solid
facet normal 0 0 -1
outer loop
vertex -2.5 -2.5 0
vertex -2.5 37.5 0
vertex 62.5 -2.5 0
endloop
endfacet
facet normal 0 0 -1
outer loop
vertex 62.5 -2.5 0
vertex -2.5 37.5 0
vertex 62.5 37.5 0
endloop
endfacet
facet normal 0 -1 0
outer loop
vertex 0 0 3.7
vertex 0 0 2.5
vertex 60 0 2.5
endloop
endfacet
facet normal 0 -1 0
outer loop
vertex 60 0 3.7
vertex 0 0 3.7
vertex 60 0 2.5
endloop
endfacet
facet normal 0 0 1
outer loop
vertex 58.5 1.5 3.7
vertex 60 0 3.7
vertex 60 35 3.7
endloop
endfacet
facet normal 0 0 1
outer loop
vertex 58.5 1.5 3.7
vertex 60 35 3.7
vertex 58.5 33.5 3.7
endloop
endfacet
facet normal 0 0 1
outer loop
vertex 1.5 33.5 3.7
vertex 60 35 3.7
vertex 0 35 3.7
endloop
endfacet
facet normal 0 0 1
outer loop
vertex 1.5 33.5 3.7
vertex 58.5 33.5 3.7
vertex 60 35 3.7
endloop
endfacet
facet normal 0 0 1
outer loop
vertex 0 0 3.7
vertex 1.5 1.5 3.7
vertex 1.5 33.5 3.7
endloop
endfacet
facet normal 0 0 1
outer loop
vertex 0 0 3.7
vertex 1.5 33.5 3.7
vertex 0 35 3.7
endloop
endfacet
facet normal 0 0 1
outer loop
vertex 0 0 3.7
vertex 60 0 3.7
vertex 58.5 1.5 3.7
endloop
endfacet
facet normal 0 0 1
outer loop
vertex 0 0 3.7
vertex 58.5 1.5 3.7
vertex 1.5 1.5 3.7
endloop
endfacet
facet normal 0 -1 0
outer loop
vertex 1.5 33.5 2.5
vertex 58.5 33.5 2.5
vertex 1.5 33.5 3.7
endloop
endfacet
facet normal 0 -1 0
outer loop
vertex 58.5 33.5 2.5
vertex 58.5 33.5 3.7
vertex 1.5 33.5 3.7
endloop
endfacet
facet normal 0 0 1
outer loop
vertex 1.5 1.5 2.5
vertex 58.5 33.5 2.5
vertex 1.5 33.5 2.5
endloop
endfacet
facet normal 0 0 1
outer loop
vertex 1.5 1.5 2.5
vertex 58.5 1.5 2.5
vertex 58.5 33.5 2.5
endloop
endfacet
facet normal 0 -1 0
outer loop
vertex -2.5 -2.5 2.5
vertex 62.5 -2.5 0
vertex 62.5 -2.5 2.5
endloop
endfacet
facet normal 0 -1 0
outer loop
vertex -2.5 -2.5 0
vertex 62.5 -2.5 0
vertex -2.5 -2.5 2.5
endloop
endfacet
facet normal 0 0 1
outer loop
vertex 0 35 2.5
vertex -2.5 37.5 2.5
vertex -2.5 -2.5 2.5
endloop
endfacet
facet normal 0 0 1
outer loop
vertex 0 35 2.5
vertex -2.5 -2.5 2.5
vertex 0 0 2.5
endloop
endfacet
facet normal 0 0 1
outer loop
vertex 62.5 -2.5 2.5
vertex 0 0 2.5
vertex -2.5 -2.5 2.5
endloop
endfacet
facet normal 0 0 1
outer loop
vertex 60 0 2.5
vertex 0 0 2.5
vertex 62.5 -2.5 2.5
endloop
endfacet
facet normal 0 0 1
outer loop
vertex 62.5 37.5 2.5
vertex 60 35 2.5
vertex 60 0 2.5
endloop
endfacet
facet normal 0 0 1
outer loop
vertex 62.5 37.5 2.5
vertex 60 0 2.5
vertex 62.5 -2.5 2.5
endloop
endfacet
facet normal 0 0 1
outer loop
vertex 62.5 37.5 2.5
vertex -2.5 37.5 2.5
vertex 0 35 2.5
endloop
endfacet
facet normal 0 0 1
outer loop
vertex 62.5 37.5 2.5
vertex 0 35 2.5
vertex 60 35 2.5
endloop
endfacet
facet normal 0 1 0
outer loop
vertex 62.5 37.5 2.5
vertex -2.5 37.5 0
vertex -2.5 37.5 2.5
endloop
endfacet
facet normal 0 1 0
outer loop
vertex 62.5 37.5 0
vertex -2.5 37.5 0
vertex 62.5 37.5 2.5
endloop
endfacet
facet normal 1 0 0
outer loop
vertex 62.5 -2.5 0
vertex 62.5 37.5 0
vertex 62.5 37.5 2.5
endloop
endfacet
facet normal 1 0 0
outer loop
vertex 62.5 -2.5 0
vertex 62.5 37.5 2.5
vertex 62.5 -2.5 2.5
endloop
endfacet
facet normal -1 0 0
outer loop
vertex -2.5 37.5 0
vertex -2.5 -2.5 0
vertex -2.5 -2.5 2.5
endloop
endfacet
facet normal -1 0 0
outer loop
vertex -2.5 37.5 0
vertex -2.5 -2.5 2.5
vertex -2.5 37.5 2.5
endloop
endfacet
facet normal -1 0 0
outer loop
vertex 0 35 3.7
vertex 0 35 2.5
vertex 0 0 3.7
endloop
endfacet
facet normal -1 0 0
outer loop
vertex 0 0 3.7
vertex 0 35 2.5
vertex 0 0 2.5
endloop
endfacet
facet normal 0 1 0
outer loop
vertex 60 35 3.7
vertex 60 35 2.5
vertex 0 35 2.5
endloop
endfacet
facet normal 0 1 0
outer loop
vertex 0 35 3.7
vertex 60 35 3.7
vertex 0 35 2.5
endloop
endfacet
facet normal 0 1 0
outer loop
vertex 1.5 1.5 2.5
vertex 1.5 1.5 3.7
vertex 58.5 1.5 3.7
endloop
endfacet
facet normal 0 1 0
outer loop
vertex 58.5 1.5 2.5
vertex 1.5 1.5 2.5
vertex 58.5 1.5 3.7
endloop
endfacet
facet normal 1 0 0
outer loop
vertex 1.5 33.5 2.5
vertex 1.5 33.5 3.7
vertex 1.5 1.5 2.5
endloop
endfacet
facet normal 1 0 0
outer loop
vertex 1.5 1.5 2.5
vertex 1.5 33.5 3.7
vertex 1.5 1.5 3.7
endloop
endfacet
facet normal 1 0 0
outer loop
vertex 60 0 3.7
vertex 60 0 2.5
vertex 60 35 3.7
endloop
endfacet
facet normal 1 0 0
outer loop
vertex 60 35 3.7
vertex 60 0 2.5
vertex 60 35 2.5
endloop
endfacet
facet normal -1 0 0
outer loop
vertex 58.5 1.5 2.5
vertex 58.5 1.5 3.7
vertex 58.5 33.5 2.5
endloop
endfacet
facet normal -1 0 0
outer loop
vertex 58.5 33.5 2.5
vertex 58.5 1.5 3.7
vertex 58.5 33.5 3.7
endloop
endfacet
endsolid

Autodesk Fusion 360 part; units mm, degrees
sketch "Skizze2" plane through (0, 0, 0) normal (0, 0, 1) x (1, 0, 0)
  line L0 (-2.5, 35) -> (-2.5, 37.5)
  line L1 (-2.5, 37.5) -> (0, 37.5)
  line L2 (62.5, 0) -> (62.5, -2.5)
  line L3 (62.5, -2.5) -> (60, -2.5)
  line L4 (-2.5, 37.5) -> (62.5, 37.5)
  line L5 (62.5, 37.5) -> (62.5, -2.5)
  line L6 (62.5, -2.5) -> (-2.5, -2.5)
  line L7 (-2.5, -2.5) -> (-2.5, 37.5)
  point P0 (0, 35)
  point P1 (60, 0)
  dimension "d3" = 2.5
  dimension "d4" = 2.5
  dimension "d5" = 2.5
  dimension "d6" = 2.5
extrude "Extrusion1" add sketch "Skizze2" along normal blind 2.5
sketch "Skizze3" plane through (0, 0, 2.5) normal (0, 0, 1) x (-1, 0, 0)
  line L0 (2.5, 2.5) -> (-62.5, 2.5)
  line L1 (-62.5, 2.5) -> (-62.5, -37.5)
  line L2 (-62.5, -37.5) -> (2.5, -37.5)
  line L3 (2.5, -37.5) -> (2.5, 2.5)
  line L4 (-62.5, -37.5) -> (-60, -37.5)
  line L5 (-62.5, -35) -> (-62.5, -37.5)
  line L6 (2.5, 2.5) -> (0, 2.5)
  line L7 (2.5, 0) -> (2.5, 2.5)
  line L8 (0, 0) -> (-60, 0)
  line L9 (-60, 0) -> (-60, -35)
  line L10 (-60, -35) -> (0, -35)
  line L11 (0, -35) -> (0, 0)
  dimension "d9" = 2.5
  dimension "d10" = 2.5
  dimension "d11" = 2.5
  dimension "d12" = 2.5
extrude "Extrusion2" add sketch "Skizze3" along normal blind 2 contours L8 L9 L10 L11
sketch "Skizze4" plane through (0, 0, 4.5) normal (0, 0, 1) x (-1, 0, 0)
  line L0 (0, -35) -> (0, 0)
  line L1 (0, 0) -> (-60, 0)
  line L2 (-60, 0) -> (-60, -35)
  line L3 (-60, -35) -> (0, -35)
  line L4 (-1.5, -1.5) -> (-58.5, -1.5)
  line L5 (-58.5, -1.5) -> (-58.5, -33.5)
  line L6 (-58.5, -33.5) -> (-1.5, -33.5)
  line L7 (-1.5, -33.5) -> (-1.5, -1.5)
extrude "Extrusion3" cut sketch "Skizze4" against normal blind 2 contours L4 L5 L6 L7
extrude "Extrusion4" cut 1 faces at (39.5, 0.5, 4.5) along direction (0, 0, -1) blind 0.8
